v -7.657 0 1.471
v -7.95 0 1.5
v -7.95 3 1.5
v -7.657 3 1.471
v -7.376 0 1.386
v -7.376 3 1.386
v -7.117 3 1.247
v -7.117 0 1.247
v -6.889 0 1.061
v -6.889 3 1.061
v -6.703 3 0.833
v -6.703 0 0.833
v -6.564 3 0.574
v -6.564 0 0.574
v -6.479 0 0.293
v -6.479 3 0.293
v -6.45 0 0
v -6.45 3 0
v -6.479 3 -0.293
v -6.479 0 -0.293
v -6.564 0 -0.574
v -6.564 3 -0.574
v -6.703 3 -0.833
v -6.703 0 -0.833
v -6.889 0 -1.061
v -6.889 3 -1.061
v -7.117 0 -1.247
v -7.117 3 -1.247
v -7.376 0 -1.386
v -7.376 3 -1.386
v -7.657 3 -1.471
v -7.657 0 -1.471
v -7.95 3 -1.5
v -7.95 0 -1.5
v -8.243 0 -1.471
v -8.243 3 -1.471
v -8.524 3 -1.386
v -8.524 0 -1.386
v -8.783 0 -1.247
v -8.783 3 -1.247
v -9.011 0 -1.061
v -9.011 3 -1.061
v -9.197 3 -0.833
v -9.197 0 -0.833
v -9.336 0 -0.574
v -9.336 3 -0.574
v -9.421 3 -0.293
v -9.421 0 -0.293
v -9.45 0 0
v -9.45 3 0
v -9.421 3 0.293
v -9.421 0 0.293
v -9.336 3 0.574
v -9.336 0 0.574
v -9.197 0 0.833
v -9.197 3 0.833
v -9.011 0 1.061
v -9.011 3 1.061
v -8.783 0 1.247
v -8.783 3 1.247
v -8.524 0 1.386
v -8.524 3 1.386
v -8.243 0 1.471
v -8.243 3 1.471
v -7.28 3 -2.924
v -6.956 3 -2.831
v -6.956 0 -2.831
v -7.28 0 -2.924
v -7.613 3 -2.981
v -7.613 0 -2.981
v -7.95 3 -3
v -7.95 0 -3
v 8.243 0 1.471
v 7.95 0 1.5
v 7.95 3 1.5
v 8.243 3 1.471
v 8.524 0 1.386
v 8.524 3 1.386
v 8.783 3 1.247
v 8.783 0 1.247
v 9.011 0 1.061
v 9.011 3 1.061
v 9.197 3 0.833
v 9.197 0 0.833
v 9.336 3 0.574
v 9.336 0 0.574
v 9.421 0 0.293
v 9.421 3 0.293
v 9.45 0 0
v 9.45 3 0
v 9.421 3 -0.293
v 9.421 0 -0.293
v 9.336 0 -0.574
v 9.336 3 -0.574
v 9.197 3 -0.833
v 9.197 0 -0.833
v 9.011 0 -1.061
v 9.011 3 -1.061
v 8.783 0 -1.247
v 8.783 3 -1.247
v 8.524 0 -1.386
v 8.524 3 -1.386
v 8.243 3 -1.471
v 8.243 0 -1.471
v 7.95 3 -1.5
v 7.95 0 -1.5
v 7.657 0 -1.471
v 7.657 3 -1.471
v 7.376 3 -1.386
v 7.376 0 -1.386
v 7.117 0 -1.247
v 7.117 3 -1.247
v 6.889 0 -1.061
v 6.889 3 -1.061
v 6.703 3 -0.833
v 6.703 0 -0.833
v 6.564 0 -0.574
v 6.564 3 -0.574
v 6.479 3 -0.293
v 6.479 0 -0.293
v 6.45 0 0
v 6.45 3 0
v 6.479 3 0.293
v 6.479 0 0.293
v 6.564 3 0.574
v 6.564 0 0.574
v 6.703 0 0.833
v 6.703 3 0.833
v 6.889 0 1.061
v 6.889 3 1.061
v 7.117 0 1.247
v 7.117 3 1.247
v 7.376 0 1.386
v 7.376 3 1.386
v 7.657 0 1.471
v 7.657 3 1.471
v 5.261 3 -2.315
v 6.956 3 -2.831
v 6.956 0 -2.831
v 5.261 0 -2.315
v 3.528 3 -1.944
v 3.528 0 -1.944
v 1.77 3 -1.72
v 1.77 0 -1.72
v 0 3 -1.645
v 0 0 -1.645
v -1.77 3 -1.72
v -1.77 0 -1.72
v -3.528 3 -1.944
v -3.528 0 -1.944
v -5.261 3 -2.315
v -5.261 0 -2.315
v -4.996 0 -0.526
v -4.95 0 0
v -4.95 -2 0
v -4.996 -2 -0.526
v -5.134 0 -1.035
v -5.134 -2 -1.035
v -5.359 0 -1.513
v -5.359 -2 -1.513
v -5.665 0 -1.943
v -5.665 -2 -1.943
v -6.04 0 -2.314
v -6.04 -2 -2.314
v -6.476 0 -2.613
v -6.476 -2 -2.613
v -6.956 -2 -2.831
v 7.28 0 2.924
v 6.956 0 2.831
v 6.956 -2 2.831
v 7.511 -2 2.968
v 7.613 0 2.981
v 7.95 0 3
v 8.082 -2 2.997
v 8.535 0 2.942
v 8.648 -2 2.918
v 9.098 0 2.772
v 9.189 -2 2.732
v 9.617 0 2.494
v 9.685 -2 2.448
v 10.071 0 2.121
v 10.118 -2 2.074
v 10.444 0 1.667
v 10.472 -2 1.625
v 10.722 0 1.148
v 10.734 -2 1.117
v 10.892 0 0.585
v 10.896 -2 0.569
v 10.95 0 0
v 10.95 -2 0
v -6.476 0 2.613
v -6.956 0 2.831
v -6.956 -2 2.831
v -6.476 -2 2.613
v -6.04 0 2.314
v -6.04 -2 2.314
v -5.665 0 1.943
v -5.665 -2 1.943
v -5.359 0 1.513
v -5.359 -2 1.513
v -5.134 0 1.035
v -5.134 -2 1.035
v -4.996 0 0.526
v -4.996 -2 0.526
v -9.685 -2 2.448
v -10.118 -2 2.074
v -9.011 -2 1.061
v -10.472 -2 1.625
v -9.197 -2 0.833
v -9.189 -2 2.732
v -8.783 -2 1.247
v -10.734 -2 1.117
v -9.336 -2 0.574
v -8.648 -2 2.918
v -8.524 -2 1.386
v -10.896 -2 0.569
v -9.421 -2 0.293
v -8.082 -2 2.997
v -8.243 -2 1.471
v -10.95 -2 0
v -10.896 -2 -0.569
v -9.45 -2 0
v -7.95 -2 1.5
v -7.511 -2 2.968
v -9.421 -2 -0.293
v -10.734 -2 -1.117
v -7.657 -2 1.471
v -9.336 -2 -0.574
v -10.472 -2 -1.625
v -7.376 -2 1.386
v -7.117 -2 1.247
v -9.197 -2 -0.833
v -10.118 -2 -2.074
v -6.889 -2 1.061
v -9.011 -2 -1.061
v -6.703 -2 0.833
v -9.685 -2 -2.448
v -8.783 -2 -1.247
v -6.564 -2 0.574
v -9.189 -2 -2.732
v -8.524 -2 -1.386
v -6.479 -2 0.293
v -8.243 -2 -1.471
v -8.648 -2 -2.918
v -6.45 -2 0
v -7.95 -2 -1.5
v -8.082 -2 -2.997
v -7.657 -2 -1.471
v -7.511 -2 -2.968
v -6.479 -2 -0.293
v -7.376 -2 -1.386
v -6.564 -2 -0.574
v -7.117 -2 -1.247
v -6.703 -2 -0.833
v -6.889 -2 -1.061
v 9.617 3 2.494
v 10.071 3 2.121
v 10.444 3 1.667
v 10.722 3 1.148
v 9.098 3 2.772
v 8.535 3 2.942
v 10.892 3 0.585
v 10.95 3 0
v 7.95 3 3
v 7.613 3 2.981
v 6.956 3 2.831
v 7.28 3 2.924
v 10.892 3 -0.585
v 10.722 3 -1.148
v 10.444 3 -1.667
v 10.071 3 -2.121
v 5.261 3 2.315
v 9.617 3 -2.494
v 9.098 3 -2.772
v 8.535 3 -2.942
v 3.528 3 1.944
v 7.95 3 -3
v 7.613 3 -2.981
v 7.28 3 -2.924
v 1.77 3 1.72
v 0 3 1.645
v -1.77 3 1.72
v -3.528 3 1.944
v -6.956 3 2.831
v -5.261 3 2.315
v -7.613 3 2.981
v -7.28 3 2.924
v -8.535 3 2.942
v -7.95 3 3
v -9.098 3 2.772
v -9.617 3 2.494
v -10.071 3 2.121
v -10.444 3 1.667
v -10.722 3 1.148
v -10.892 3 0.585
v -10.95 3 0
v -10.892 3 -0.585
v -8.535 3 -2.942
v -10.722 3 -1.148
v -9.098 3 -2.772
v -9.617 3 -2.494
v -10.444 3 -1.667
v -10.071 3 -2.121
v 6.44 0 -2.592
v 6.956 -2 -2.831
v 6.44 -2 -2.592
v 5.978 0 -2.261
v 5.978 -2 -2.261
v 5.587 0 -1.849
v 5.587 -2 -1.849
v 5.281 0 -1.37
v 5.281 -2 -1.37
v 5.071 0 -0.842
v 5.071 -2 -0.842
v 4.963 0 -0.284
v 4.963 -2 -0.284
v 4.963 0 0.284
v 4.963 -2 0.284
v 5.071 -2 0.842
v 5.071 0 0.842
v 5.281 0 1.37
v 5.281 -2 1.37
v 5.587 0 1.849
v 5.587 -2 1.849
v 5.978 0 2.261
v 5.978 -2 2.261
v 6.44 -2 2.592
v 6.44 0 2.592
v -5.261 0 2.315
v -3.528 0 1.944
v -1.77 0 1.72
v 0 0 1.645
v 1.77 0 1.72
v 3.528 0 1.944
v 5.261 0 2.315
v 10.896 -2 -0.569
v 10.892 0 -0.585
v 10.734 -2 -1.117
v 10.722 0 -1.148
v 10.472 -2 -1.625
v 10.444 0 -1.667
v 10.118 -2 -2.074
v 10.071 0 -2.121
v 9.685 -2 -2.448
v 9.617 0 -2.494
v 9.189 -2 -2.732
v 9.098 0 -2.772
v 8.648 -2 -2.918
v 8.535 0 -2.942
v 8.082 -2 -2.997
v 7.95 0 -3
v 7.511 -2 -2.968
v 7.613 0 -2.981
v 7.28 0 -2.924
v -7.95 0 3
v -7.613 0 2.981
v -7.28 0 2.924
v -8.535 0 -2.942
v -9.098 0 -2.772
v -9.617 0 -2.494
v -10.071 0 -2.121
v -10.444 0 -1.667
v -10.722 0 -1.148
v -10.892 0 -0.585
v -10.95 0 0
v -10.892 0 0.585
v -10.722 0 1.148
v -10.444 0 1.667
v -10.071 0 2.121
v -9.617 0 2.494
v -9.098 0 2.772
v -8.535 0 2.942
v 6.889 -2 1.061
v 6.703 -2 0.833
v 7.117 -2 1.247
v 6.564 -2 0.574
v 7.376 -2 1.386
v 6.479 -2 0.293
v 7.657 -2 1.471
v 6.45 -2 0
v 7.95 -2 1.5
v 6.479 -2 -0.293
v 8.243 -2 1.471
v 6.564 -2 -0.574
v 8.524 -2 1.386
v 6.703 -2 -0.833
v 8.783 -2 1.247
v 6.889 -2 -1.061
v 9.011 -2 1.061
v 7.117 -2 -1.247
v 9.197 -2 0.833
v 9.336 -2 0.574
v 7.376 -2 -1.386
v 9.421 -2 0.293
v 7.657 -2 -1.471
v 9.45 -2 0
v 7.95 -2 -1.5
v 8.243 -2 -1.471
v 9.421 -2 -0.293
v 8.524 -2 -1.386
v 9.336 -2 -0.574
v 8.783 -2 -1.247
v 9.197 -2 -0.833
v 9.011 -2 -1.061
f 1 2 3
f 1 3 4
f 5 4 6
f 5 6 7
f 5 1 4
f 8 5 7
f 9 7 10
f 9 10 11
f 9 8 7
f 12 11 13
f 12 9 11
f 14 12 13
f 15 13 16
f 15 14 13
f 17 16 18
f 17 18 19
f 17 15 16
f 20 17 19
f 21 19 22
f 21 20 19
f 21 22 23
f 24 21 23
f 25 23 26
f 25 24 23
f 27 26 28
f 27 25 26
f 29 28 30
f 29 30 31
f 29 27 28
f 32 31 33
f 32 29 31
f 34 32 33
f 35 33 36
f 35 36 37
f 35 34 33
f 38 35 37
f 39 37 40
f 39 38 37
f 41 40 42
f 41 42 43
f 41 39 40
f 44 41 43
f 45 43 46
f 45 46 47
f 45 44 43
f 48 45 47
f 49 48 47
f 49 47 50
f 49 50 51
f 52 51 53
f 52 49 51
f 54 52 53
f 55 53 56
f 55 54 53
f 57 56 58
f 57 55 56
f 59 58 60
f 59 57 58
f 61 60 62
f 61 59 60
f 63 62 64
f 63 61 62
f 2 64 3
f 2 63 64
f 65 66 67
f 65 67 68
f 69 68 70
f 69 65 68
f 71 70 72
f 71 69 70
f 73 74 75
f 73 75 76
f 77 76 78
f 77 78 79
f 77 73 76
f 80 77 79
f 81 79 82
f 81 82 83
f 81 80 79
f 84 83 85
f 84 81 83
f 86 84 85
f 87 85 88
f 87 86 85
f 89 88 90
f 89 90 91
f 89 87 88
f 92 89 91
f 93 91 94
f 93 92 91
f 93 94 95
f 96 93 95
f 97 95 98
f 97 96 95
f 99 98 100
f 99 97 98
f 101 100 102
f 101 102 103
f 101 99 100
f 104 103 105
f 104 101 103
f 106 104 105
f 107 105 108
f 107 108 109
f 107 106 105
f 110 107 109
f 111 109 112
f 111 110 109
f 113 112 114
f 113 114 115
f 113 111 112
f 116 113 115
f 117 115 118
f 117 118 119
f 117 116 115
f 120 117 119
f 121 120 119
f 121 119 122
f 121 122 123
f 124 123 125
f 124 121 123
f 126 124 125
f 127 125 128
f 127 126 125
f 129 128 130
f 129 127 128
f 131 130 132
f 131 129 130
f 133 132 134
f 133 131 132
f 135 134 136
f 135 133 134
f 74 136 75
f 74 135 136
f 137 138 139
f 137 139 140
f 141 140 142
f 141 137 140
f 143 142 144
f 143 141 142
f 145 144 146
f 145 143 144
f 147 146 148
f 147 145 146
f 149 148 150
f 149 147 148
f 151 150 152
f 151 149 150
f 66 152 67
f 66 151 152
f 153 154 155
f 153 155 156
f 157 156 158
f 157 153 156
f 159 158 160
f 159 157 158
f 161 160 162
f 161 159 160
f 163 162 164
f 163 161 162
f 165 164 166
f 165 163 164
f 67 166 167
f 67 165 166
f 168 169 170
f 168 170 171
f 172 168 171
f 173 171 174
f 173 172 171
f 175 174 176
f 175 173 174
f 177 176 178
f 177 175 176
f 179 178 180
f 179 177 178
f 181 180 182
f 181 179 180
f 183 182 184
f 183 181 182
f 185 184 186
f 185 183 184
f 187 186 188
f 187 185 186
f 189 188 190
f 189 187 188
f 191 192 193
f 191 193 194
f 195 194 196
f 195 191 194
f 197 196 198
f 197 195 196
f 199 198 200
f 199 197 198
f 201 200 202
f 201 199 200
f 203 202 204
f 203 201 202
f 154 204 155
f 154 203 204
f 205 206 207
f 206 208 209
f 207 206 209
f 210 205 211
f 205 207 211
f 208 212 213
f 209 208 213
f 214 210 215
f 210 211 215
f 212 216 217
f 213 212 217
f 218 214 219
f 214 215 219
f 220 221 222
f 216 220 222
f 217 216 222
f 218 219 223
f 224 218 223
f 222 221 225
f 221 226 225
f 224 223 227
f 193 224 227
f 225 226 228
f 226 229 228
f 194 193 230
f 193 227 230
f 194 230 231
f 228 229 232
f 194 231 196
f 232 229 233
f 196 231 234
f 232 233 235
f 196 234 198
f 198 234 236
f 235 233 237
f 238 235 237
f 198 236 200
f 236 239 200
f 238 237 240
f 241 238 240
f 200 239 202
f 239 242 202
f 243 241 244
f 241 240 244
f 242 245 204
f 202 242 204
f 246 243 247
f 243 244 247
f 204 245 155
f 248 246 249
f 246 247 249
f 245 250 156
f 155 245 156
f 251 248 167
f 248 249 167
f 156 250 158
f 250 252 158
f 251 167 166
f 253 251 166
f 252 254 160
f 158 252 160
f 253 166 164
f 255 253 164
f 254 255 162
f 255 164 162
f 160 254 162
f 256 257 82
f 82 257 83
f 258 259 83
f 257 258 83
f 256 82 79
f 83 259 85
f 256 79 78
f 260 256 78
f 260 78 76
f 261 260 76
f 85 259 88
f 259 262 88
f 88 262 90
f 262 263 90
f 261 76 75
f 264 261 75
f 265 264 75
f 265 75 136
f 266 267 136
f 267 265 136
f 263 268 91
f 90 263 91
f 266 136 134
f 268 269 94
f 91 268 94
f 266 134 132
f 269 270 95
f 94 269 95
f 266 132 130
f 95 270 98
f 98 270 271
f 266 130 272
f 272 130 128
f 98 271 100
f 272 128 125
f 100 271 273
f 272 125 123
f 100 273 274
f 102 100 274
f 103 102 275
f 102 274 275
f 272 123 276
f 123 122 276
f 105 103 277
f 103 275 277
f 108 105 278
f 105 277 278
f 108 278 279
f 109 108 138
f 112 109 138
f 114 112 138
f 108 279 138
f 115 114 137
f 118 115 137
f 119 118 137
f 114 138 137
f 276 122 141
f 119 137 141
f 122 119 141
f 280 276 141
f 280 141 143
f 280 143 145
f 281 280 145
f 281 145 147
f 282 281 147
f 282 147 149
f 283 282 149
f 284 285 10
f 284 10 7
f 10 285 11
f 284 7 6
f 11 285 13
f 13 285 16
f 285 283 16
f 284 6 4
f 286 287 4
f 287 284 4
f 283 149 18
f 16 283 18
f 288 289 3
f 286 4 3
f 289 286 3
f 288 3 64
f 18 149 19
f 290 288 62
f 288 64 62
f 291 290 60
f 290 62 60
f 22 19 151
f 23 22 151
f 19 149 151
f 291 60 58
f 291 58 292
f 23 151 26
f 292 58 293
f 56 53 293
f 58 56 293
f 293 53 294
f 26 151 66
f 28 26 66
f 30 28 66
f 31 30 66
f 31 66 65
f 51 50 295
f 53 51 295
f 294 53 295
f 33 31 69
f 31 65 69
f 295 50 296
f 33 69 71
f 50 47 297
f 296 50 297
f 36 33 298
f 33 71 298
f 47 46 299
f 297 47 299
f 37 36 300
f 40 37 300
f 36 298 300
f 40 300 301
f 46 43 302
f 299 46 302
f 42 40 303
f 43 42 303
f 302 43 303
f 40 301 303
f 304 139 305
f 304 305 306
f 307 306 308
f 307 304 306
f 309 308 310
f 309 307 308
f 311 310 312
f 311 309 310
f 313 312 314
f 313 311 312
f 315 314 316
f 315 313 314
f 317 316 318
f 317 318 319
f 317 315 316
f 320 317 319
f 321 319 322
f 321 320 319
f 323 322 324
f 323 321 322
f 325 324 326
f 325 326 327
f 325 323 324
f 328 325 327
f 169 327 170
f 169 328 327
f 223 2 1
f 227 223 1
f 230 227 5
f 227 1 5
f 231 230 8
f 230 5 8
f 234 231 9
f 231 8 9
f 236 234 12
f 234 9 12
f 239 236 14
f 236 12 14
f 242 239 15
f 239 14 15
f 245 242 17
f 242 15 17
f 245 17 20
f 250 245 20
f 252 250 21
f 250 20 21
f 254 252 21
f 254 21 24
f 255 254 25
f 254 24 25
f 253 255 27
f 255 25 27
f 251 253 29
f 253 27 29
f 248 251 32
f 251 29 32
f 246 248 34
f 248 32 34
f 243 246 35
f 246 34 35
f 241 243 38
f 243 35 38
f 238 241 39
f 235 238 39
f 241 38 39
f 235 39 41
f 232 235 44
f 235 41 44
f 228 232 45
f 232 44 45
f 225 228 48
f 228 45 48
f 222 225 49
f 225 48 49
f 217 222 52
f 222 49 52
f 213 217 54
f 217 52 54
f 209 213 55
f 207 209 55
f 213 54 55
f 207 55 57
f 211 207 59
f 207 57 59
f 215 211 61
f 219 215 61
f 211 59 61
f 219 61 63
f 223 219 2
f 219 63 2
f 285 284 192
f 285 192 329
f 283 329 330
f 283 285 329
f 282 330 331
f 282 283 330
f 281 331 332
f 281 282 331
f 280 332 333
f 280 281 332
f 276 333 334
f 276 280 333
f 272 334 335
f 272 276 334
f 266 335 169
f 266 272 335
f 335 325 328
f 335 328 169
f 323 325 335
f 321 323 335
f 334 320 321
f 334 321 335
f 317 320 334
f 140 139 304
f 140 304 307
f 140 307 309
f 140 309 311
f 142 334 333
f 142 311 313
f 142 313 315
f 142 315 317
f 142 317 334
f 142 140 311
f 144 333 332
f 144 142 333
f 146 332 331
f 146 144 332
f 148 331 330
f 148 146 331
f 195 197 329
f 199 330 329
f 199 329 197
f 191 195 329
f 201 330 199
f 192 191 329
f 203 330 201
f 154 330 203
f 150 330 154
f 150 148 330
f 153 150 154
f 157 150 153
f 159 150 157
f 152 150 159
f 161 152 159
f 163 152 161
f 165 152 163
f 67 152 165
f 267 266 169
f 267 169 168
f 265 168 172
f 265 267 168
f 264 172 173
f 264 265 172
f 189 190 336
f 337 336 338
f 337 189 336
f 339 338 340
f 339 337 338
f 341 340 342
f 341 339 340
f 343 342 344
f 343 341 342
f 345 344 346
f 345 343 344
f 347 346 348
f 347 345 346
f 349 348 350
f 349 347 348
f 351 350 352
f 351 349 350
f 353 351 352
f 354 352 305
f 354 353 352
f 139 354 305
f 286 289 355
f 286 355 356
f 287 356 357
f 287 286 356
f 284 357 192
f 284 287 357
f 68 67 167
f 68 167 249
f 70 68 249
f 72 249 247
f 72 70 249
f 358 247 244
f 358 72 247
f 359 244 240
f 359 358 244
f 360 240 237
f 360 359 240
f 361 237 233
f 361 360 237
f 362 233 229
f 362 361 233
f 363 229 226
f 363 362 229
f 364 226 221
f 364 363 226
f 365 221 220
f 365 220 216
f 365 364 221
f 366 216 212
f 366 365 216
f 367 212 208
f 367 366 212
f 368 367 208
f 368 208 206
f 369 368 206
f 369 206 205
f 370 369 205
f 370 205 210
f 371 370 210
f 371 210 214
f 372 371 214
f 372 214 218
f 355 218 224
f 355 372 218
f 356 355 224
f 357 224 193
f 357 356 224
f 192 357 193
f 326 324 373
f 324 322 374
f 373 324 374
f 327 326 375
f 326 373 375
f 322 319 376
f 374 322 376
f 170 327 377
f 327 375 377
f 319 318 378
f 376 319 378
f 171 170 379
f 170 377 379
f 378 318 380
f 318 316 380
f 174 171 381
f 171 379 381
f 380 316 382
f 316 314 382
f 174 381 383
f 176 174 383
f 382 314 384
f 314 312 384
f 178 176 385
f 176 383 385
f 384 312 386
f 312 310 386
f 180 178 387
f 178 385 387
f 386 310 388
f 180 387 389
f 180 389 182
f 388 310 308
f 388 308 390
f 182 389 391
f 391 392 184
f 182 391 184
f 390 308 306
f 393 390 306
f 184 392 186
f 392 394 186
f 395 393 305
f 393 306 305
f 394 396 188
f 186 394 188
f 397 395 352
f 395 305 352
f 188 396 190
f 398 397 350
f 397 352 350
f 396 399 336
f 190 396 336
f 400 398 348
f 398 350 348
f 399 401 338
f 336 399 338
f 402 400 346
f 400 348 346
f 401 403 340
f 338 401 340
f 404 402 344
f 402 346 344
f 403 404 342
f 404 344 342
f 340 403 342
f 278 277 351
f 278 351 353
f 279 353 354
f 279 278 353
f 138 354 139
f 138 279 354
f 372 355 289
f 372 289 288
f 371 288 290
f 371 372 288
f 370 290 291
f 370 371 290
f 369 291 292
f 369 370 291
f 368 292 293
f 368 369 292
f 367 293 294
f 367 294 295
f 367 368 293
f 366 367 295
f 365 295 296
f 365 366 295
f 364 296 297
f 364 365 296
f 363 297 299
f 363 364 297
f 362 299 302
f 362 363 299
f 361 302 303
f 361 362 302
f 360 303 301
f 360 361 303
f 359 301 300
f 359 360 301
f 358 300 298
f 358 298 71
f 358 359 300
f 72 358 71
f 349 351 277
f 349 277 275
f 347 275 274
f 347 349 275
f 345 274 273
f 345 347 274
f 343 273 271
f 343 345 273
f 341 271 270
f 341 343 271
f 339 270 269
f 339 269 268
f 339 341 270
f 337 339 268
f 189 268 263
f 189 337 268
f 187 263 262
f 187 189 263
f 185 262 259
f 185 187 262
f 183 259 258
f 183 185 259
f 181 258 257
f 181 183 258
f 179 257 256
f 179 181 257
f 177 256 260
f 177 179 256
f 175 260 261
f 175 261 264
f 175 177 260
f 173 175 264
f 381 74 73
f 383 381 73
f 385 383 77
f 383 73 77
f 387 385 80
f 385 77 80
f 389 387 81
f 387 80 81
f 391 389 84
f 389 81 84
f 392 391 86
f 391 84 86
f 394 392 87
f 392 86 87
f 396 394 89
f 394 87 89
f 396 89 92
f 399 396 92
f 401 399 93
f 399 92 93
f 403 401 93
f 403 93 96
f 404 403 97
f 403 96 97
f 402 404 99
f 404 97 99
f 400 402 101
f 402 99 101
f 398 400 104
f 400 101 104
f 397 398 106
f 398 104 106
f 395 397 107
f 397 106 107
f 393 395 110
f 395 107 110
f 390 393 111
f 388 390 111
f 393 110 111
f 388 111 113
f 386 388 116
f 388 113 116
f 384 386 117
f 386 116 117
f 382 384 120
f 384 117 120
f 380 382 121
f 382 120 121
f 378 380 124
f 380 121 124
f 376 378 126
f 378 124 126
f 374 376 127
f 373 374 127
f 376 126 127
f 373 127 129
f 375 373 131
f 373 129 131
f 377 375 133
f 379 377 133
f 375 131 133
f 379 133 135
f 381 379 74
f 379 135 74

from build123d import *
from build123d.topology import SkipClean

# Parameters (mm, degrees)
SKETCH1_R           = 1.5
BOSS_EXTRUDE1_DEPTH = 3
SKETCH2_OUTSIDE_W   = 28.48
SKETCH2_OUTSIDE_H   = 12.58
CUT_EXTRUDE1_DEPTH  = 12.743189516
BOSS_EXTRUDE2_START = -3
SKETCH3_R           = 1.5
BOSS_EXTRUDE2_DEPTH = 2


with BuildPart() as part:
    # Sketch1 → Boss-Extrude1 (new body)
    with BuildSketch(Plane(origin=(0, 0, 0), x_dir=(1, 0, 0), z_dir=(0, 1, 0))):
        with BuildLine():
            Line((-7.95, 3), (7.95, 3))
            ThreePointArc((7.95, 3), (10.95, 0), (7.95, -3))
            Line((7.95, -3), (-7.95, -3))
            ThreePointArc((-7.95, -3), (-10.95, 0), (-7.95, 3))
        make_face()
        with Locations(Location((-7.95, 0, 0), (0, 0, 270))):
            Circle(SKETCH1_R, mode=Mode.SUBTRACT)
        with Locations(Location((7.95, 0, 0), (0, 0, 270))):
            Circle(SKETCH1_R, mode=Mode.SUBTRACT)
    extrude(amount=BOSS_EXTRUDE1_DEPTH)

    # Sketch2 outside → Cut-Extrude1 (cut, through all)
    with SkipClean():  # the faces are left unmerged after this step: merging them gives an invalid solid
        with BuildSketch(Plane(origin=(0, 3, 0), x_dir=(1, 0, 0), z_dir=(0, 1, 0))):
            Rectangle(SKETCH2_OUTSIDE_W, SKETCH2_OUTSIDE_H)
            with BuildLine():
                ThreePointArc((-6.95625, 2.830629071), (-10.95, 0), (-6.95625, -2.830629071))
                ThreePointArc((-6.95625, -2.830629071), (0, -1.645032568), (6.95625, -2.830629071))
                ThreePointArc((6.95625, -2.830629071), (10.95, 0), (6.95625, 2.830629071))
                ThreePointArc((6.95625, 2.830629071), (0, 1.645032568), (-6.95625, 2.830629071))
            make_face(mode=Mode.SUBTRACT)
        extrude(amount=-CUT_EXTRUDE1_DEPTH, mode=Mode.SUBTRACT)

    # Sketch3 → Boss-Extrude2 (add)
    with SkipClean():  # the faces are left unmerged after this step: merging them gives an invalid solid
        with BuildSketch(Plane(origin=(0, 3, 0), x_dir=(1, 0, 0), z_dir=(0, 1, 0)).offset(BOSS_EXTRUDE2_START)):
            with BuildLine():
                ThreePointArc((-6.95625, -2.830629071), (-5.502424669, -1.734755026), (-4.95, 0))
                ThreePointArc((-4.95, 0), (-5.502424669, 1.734755026), (-6.95625, 2.830629071))
                ThreePointArc((-6.95625, 2.830629071), (-10.95, 0), (-6.95625, -2.830629071))
            make_face()
            with Locations(Location((-7.95, 0, 0), (0, 0, 270))):
                Circle(SKETCH3_R, mode=Mode.SUBTRACT)
            with BuildLine():
                ThreePointArc((6.95625, -2.830629071), (9.684755026, -2.447575331), (10.95, 0))
                ThreePointArc((10.95, 0), (9.684755026, 2.447575331), (6.95625, 2.830629071))
                ThreePointArc((6.95625, 2.830629071), (4.95, 0), (6.95625, -2.830629071))
            make_face()
            with Locations(Location((7.95, 0, 0), (0, 0, 270))):
                Circle(SKETCH3_R, mode=Mode.SUBTRACT)
        extrude(amount=-BOSS_EXTRUDE2_DEPTH)


solid = part.part
